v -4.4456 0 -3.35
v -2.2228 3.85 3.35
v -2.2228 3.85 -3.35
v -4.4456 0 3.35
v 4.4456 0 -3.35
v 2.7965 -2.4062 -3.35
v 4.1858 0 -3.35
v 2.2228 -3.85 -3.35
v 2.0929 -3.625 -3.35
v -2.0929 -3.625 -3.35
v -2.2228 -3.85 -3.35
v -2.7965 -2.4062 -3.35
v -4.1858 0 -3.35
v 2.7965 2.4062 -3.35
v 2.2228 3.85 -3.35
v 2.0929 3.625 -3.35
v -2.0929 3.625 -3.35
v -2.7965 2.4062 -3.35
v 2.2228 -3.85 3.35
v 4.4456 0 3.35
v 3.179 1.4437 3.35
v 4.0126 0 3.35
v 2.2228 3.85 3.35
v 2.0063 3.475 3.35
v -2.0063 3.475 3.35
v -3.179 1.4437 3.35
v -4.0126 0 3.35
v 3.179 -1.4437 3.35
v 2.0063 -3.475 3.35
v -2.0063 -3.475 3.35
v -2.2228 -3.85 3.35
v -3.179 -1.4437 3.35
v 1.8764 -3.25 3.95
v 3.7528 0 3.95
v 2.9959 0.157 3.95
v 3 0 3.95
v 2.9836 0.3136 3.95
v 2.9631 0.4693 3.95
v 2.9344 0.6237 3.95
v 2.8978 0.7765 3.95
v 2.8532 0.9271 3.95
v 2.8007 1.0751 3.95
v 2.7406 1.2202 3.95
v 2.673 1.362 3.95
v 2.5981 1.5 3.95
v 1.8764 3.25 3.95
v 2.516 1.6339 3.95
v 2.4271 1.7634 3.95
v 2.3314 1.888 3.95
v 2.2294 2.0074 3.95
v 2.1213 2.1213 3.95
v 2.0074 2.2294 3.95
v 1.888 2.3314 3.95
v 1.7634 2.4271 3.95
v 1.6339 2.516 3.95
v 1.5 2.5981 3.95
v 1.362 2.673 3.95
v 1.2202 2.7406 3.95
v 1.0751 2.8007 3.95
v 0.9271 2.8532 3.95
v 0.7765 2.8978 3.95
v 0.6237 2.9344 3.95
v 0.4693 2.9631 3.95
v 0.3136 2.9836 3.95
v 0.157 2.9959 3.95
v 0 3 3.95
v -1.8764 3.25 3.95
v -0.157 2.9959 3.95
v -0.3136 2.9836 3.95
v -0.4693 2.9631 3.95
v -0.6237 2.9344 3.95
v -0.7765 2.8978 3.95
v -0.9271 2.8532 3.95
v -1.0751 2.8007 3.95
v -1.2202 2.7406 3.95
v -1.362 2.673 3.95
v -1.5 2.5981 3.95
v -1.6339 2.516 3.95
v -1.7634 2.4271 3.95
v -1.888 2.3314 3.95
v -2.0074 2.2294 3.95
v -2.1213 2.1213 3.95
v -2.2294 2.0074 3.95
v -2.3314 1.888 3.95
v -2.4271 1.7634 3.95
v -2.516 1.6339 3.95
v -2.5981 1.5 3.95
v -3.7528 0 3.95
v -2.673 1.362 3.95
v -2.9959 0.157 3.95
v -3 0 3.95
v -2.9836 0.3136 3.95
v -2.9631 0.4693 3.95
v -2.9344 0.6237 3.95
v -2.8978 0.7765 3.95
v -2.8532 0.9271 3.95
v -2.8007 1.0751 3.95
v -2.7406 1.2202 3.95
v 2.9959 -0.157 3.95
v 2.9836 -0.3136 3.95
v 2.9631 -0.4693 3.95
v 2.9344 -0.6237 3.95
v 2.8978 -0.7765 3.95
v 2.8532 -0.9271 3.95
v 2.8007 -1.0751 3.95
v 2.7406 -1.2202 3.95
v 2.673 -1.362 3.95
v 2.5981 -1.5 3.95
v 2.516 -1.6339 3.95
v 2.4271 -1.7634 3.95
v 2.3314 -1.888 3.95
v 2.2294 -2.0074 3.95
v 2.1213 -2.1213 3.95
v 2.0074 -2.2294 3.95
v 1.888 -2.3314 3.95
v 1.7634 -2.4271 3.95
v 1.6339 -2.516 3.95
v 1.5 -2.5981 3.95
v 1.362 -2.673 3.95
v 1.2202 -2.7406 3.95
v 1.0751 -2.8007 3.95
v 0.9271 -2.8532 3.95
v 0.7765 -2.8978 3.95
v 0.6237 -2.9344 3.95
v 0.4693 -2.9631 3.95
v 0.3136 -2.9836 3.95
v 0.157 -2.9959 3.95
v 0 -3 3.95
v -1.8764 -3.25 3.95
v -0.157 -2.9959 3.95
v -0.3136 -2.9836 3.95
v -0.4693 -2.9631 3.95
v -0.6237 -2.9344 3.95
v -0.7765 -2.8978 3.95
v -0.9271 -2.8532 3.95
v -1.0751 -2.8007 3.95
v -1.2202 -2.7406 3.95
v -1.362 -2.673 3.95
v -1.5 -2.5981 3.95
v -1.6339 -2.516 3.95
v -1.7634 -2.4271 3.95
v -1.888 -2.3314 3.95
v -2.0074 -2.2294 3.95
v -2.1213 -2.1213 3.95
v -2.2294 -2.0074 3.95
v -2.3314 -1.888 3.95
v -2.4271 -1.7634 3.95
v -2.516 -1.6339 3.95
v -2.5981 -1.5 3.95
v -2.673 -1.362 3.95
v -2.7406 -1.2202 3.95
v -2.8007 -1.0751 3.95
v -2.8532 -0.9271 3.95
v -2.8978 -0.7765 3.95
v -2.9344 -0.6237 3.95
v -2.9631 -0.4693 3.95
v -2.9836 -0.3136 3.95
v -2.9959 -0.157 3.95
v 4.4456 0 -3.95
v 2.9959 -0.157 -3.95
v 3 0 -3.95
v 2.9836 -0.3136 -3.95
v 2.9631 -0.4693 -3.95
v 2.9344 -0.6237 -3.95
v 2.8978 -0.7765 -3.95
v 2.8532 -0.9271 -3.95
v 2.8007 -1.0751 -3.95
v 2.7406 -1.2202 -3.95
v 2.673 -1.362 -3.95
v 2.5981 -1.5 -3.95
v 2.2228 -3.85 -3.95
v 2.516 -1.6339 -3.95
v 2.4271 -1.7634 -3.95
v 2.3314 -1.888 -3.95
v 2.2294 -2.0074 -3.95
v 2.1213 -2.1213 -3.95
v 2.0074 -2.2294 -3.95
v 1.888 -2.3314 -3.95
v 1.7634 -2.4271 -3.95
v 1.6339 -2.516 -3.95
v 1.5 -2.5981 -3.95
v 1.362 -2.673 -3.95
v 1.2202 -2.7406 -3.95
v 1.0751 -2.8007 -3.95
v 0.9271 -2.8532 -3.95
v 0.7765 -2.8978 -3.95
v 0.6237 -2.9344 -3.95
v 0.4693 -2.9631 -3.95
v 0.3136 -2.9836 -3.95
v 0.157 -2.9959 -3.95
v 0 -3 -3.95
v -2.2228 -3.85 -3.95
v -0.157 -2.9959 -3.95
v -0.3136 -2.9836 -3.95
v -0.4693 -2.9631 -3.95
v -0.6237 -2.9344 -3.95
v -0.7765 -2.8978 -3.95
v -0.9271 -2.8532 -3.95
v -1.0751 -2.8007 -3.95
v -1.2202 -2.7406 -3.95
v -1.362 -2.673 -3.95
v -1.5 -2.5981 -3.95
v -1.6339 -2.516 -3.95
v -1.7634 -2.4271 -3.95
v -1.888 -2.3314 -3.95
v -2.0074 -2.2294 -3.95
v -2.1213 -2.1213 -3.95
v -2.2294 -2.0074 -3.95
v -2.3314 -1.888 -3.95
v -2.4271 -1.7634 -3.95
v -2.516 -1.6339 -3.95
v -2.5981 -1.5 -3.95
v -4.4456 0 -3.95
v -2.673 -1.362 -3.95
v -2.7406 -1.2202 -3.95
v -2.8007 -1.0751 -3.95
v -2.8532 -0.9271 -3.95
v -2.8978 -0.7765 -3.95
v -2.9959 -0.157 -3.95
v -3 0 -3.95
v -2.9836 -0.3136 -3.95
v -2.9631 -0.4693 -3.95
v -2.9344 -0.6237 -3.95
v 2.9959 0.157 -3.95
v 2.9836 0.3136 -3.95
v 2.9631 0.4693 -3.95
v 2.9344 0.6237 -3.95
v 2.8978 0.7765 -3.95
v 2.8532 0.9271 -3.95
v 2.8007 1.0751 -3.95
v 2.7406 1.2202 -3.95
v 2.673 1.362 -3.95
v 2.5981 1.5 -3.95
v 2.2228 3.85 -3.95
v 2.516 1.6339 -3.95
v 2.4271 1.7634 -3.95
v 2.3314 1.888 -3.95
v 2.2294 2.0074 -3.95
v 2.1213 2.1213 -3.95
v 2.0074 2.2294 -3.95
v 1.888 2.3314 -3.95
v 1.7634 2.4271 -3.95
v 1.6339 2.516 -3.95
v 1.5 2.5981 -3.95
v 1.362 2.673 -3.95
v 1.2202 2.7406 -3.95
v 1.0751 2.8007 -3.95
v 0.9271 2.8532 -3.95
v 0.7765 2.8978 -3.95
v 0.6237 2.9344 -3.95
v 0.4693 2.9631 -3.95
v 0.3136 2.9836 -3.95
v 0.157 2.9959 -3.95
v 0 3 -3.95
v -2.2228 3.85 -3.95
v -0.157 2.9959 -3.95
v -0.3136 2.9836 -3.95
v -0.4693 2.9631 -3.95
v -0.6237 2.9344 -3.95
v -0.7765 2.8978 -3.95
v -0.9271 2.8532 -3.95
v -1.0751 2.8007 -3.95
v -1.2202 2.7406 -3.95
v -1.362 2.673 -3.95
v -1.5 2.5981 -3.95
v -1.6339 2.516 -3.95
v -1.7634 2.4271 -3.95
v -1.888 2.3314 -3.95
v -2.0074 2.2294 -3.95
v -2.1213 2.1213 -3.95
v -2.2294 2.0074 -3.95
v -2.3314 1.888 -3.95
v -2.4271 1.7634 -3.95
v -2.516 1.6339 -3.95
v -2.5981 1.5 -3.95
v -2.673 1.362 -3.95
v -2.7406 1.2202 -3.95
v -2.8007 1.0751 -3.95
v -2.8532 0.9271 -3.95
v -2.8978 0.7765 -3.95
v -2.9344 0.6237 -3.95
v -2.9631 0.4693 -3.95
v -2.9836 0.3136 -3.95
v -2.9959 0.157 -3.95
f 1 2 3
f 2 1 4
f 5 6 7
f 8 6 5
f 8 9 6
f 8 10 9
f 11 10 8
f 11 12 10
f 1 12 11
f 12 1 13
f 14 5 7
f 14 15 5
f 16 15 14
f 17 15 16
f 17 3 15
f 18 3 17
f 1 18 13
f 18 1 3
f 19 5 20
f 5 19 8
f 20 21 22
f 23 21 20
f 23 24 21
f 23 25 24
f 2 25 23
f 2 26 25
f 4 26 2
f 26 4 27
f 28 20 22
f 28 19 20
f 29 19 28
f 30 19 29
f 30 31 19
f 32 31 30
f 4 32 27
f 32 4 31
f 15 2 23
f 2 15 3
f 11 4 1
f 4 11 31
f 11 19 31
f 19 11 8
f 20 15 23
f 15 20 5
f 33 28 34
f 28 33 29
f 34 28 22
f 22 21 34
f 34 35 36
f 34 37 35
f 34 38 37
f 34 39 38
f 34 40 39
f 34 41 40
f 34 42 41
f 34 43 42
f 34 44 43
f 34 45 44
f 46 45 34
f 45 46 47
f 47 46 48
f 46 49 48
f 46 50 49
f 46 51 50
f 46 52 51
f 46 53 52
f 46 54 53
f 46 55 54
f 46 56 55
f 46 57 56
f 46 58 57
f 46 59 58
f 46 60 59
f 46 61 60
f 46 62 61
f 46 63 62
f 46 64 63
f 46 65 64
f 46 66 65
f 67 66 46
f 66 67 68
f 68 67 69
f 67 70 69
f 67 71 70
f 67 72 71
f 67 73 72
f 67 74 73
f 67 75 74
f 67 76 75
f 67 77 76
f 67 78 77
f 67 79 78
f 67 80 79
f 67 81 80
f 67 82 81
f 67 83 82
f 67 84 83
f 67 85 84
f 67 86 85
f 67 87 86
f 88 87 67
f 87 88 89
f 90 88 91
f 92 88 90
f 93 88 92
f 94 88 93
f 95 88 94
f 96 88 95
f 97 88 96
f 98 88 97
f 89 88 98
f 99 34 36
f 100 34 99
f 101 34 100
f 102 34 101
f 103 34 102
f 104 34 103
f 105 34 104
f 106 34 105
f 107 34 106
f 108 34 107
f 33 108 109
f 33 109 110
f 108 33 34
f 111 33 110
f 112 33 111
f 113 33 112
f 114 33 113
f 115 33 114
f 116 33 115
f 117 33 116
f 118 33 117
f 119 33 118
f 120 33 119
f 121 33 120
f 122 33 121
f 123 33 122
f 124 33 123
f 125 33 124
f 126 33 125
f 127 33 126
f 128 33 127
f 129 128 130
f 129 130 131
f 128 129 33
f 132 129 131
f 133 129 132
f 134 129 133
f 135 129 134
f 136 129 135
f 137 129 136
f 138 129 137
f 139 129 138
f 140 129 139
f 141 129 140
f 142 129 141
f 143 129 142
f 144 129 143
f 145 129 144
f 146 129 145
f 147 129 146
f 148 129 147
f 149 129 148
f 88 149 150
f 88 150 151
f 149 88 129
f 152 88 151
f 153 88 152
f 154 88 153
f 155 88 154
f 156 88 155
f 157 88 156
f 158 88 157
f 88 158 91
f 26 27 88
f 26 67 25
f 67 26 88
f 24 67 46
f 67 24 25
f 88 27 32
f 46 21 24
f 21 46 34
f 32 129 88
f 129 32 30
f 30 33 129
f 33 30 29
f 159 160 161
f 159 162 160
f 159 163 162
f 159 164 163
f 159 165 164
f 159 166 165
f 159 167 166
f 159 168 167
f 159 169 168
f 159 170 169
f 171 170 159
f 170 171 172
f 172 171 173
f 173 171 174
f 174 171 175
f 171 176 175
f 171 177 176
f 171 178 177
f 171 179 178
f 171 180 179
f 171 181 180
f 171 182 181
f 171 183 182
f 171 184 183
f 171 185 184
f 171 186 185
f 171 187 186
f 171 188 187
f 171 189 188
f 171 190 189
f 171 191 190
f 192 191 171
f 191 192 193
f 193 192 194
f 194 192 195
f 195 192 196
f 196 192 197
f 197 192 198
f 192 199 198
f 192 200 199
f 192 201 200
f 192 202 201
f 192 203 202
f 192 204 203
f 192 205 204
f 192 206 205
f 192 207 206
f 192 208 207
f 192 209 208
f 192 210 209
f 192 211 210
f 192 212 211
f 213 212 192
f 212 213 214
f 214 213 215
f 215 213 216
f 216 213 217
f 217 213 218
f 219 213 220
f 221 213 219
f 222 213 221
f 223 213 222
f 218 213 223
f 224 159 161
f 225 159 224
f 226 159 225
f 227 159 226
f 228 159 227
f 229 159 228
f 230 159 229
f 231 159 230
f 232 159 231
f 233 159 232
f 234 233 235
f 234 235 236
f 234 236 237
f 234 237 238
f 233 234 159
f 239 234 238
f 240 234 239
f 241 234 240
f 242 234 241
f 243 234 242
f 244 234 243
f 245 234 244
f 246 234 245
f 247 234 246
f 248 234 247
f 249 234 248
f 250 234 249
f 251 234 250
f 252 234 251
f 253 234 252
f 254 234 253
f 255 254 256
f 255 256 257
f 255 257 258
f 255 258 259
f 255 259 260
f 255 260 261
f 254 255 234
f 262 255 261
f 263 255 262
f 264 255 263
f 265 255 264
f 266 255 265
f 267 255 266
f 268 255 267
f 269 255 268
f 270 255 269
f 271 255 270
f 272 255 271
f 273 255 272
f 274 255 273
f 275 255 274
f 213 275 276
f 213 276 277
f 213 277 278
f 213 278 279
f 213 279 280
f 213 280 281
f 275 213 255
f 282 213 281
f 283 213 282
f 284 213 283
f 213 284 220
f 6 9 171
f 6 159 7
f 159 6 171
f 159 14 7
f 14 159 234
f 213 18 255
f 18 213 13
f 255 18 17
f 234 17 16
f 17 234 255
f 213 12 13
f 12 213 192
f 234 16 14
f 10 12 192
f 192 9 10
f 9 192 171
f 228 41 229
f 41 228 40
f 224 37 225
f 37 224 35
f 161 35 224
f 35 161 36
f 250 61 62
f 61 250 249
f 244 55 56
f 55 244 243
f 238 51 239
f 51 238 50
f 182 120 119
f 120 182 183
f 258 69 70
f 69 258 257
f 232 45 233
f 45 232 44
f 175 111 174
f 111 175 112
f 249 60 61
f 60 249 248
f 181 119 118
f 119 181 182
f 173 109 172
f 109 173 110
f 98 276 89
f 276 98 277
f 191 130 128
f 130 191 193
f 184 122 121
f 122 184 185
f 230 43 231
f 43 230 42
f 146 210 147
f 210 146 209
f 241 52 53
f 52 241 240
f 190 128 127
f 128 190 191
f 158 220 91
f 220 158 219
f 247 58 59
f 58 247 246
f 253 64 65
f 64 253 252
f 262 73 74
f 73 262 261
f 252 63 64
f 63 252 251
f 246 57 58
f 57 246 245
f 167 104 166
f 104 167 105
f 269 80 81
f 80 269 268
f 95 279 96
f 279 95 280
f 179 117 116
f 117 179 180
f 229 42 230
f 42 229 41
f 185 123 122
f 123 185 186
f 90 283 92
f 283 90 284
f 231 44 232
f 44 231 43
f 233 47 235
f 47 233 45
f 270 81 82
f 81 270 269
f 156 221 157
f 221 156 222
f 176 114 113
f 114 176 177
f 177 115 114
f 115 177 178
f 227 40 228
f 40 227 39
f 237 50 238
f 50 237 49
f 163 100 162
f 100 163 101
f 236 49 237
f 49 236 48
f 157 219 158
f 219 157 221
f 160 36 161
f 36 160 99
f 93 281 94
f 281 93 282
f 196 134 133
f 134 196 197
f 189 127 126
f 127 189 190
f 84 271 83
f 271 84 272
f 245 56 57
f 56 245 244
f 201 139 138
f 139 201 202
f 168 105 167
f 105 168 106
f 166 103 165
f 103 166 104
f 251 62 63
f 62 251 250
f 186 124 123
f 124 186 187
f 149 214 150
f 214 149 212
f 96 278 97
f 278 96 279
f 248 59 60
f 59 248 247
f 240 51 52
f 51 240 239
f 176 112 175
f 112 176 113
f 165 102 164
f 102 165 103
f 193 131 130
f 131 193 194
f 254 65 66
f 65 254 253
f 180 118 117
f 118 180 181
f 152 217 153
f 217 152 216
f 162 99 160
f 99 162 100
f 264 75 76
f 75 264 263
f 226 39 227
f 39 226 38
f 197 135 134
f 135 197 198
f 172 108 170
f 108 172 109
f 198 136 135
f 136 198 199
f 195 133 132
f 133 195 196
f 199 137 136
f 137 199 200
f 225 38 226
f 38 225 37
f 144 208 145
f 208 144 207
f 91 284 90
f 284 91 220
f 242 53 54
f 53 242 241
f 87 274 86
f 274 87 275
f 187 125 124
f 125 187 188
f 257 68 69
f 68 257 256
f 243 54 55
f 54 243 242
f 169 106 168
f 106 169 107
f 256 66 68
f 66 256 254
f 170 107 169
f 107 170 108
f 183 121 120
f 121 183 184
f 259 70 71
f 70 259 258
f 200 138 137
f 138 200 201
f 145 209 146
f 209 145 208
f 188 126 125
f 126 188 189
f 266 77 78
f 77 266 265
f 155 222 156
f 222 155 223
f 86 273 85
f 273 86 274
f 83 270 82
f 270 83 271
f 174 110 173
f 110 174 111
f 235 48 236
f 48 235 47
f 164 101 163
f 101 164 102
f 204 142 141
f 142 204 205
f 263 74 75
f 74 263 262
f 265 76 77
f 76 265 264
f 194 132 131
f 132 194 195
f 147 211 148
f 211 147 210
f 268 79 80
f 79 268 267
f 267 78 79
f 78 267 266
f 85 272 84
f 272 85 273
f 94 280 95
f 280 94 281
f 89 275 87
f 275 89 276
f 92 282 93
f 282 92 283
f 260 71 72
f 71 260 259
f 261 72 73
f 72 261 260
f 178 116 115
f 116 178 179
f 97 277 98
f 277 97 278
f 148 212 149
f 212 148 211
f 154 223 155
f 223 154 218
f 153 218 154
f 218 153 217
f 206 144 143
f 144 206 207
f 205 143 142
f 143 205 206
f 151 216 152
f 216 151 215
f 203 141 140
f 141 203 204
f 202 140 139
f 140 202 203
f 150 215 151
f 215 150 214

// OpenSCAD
$fn = 120;

// Requested dimensions
af     = 7.7;   // across flats (mm)
thk    = 7.9;   // thickness (mm)
hole_d = 6.0;   // screw size / clearance (mm)

// Small modeling tolerances
eps     = 0.02;
chamfer = 0.6;  // edge chamfer height (mm)

// Connectivity overlap (1–2mm as required)
ov = 1.0;

// 2D hex profile (across-flats)
module hex2d(af_dim) {
    Rloc = af_dim / sqrt(3);
    polygon(points=[
        [ Rloc, 0],
        [ Rloc/2,  Rloc*sqrt(3)/2],
        [-Rloc/2,  Rloc*sqrt(3)/2],
        [-Rloc, 0],
        [-Rloc/2, -Rloc*sqrt(3)/2],
        [ Rloc/2, -Rloc*sqrt(3)/2]
    ]);
}

module hex_nut() {

    // Build as a single connected solid, then subtract the hole
    difference() {
        union() {
            // Main body (straight section)
            linear_extrude(height = thk - 2*chamfer, center = true)
                hex2d(af);

            // Top chamfer (overlap into main body by ov)
            translate([0, 0, (thk/2 - chamfer/2 - ov/2)])
                linear_extrude(
                    height = chamfer + ov,
                    center = true,
                    scale  = (af - 2*chamfer)/af
                )
                    hex2d(af);

            // Bottom chamfer (overlap into main body by ov)
            translate([0, 0, -(thk/2 - chamfer/2 - ov/2)])
                linear_extrude(
                    height = chamfer + ov,
                    center = true,
                    scale  = (af - 2*chamfer)/af
                )
                    hex2d(af);

            // NOTE:
            // The reported "floating thin flange/washer-like ring pieces" and
            // "thin plate-like slivers" are typical artifacts from coplanar/
            // barely-touching chamfer extrusions. The ov overlap above forces
            // real intersection (1mm) so no disconnected rings/slivers remain.
        }

        // Central through-hole
        cylinder(h = thk + 2*eps, d = hole_d, center = true);
    }
}

hex_nut();
